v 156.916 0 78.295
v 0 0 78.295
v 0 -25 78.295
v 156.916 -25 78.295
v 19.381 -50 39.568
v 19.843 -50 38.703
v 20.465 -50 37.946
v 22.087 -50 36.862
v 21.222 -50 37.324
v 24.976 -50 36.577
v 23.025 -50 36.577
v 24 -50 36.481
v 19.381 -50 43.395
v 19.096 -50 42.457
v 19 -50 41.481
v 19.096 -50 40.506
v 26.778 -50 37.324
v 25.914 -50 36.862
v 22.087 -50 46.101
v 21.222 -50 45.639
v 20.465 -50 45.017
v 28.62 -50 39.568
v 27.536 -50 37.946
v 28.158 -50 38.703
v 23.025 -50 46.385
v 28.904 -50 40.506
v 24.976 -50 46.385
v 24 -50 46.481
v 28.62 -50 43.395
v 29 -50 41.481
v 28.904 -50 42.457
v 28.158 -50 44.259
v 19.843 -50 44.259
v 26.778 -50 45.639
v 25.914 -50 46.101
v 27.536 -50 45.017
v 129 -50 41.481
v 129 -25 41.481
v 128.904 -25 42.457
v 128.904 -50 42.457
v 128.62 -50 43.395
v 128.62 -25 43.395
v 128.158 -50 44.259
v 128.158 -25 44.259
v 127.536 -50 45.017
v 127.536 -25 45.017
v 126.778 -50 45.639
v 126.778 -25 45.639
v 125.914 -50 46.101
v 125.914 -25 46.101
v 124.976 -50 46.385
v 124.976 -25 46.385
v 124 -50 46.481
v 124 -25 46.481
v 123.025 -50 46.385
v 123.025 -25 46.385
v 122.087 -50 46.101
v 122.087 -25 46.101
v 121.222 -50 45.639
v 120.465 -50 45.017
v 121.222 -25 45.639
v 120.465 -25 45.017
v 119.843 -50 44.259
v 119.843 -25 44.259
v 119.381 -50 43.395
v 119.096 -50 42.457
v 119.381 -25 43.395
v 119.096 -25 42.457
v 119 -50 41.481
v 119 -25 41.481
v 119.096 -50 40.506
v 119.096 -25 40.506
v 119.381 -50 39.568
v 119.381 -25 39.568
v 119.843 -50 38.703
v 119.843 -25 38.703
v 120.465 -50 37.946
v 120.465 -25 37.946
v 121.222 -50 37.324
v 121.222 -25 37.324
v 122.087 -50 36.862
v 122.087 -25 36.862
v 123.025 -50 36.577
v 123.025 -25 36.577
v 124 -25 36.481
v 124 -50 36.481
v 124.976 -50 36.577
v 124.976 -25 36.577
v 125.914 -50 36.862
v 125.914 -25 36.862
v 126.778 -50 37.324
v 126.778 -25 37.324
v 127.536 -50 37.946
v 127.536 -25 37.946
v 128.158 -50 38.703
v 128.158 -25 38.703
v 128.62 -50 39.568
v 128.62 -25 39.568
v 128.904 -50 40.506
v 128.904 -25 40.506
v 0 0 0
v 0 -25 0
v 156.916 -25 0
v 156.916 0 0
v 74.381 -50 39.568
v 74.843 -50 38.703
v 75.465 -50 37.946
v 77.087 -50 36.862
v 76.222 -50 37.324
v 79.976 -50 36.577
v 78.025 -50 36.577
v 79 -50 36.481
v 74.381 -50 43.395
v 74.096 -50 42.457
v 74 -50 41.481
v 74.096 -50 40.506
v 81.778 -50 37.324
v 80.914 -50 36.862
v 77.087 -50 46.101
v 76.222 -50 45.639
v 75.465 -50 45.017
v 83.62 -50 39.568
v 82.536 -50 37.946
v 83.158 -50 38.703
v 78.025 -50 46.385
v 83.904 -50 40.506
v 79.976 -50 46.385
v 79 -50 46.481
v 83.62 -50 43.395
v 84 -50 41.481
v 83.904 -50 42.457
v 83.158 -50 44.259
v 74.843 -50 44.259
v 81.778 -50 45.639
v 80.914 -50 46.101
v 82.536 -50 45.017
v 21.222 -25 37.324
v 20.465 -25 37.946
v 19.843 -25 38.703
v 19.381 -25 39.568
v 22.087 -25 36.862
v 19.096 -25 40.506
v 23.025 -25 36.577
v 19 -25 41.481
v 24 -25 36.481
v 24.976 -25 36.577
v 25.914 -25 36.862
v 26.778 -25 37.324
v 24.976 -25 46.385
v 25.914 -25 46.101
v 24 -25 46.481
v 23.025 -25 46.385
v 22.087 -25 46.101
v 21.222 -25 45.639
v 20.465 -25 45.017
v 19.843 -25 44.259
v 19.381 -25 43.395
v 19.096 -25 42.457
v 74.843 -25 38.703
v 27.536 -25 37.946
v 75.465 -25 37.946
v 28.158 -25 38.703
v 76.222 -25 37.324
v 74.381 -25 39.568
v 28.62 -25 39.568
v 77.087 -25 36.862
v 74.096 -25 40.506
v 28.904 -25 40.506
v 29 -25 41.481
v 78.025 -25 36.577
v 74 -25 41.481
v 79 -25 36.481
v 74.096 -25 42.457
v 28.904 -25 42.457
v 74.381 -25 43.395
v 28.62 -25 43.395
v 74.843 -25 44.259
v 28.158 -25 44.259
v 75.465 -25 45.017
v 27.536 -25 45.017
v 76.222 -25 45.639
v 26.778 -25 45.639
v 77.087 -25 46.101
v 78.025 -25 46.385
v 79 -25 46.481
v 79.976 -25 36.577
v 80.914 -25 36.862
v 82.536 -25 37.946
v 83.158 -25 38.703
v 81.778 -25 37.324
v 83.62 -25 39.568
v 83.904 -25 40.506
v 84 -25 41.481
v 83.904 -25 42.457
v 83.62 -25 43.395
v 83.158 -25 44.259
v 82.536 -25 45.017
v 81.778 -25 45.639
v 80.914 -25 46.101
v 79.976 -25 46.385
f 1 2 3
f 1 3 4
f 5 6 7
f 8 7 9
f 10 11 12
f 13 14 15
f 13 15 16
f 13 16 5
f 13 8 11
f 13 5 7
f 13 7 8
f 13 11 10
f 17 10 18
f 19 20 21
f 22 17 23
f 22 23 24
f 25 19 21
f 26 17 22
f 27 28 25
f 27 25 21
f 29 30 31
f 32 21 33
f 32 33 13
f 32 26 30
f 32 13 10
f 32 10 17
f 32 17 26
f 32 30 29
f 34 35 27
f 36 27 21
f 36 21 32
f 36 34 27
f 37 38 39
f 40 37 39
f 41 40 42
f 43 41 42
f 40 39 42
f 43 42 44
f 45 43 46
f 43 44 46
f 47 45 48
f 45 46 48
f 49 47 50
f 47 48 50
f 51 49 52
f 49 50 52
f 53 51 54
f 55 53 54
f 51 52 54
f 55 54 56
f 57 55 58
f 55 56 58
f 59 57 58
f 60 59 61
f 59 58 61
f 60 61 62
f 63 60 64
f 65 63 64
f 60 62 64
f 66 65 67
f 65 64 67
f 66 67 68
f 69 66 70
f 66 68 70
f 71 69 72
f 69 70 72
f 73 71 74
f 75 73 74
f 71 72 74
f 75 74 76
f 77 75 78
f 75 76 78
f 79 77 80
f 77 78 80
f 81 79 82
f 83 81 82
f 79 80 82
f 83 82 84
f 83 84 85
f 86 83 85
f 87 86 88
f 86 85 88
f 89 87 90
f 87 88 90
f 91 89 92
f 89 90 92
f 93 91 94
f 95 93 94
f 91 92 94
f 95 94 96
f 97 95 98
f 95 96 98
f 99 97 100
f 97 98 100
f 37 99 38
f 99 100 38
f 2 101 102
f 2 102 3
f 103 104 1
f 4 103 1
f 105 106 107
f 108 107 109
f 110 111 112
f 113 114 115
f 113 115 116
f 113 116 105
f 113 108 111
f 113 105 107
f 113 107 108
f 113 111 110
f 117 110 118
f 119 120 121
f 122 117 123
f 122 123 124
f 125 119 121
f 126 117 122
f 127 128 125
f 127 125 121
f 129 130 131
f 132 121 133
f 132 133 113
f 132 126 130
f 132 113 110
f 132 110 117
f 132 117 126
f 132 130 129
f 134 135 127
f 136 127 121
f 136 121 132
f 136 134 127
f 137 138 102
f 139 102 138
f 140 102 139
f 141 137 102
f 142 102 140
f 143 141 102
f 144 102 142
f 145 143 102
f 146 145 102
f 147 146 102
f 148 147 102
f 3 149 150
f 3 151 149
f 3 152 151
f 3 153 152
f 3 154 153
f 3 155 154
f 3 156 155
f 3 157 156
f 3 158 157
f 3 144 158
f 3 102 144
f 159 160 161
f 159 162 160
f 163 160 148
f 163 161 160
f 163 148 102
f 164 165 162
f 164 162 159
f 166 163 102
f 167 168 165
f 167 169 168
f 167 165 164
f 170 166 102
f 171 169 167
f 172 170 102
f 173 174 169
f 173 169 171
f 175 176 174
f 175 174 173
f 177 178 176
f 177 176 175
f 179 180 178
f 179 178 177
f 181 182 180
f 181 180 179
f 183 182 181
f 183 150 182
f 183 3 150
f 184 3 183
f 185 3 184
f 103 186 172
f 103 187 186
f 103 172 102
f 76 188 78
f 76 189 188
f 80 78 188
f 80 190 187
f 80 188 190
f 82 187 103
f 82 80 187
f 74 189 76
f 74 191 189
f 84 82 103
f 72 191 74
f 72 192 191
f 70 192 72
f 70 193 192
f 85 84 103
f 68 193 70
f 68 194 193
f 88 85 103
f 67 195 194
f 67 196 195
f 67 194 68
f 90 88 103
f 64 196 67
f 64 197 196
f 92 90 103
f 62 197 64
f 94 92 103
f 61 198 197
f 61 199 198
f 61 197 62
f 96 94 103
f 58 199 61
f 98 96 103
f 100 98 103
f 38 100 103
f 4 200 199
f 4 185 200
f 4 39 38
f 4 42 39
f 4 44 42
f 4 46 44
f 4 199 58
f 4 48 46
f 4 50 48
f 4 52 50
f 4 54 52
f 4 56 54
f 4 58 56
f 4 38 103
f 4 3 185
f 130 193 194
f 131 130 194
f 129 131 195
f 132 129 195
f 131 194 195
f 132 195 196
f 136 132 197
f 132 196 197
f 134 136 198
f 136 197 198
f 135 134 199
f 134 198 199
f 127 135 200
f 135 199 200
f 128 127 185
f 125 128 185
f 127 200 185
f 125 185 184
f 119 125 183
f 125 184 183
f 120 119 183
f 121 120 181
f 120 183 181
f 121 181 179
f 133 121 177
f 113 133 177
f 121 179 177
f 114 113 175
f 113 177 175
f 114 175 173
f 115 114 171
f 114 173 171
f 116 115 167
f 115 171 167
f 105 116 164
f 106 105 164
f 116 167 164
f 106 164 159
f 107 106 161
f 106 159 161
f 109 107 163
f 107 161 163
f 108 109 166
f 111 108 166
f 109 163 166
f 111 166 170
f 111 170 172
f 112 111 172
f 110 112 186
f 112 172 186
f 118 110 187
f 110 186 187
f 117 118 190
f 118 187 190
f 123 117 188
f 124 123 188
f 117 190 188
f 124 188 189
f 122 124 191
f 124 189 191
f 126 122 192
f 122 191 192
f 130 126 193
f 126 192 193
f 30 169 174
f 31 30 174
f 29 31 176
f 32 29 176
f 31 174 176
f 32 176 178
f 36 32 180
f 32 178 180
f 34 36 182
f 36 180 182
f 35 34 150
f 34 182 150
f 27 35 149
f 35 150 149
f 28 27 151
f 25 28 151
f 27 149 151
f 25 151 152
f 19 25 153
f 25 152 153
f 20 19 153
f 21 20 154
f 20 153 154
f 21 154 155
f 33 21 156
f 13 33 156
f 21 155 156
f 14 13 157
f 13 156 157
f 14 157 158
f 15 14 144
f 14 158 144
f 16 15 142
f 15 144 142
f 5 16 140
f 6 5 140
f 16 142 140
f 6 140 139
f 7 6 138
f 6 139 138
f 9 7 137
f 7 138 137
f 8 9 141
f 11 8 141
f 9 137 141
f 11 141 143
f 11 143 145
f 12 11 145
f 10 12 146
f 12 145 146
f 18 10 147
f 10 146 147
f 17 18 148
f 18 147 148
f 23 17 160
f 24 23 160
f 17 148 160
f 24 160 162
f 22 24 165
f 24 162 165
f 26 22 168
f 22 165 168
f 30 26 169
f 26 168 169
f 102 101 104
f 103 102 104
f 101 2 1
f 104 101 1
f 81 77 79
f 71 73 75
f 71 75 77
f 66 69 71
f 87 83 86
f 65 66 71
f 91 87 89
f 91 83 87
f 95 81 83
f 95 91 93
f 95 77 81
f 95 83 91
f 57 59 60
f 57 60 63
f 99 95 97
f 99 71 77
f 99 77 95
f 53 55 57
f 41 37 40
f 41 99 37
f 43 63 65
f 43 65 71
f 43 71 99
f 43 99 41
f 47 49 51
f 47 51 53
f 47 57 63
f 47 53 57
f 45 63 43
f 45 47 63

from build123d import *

# Parameters (mm, degrees)
F0_W     = 156.916313
F0_H     = 78.295462
F1_DEPTH = 25
F2_R     = 5
F3_DEPTH = 25


with BuildPart() as f1:
    # F0 (on Front) → F1 (new body)
    with BuildSketch(Plane.XZ):
        with Locations((78.458157, 39.147731)):
            Rectangle(F0_W, F0_H)
    extrude(amount=F1_DEPTH)

    # F2 (on face) → F3 (join)
    with BuildSketch(Plane.XZ.offset(25)):
        with Locations((24.000163, 41.481324)):
            Circle(F2_R)
        with Locations((79.000163, 41.481324)):
            Circle(F2_R)
        with Locations((124.000163, 41.481324)):
            Circle(F2_R)
    extrude(amount=F3_DEPTH)


solid = f1.part
